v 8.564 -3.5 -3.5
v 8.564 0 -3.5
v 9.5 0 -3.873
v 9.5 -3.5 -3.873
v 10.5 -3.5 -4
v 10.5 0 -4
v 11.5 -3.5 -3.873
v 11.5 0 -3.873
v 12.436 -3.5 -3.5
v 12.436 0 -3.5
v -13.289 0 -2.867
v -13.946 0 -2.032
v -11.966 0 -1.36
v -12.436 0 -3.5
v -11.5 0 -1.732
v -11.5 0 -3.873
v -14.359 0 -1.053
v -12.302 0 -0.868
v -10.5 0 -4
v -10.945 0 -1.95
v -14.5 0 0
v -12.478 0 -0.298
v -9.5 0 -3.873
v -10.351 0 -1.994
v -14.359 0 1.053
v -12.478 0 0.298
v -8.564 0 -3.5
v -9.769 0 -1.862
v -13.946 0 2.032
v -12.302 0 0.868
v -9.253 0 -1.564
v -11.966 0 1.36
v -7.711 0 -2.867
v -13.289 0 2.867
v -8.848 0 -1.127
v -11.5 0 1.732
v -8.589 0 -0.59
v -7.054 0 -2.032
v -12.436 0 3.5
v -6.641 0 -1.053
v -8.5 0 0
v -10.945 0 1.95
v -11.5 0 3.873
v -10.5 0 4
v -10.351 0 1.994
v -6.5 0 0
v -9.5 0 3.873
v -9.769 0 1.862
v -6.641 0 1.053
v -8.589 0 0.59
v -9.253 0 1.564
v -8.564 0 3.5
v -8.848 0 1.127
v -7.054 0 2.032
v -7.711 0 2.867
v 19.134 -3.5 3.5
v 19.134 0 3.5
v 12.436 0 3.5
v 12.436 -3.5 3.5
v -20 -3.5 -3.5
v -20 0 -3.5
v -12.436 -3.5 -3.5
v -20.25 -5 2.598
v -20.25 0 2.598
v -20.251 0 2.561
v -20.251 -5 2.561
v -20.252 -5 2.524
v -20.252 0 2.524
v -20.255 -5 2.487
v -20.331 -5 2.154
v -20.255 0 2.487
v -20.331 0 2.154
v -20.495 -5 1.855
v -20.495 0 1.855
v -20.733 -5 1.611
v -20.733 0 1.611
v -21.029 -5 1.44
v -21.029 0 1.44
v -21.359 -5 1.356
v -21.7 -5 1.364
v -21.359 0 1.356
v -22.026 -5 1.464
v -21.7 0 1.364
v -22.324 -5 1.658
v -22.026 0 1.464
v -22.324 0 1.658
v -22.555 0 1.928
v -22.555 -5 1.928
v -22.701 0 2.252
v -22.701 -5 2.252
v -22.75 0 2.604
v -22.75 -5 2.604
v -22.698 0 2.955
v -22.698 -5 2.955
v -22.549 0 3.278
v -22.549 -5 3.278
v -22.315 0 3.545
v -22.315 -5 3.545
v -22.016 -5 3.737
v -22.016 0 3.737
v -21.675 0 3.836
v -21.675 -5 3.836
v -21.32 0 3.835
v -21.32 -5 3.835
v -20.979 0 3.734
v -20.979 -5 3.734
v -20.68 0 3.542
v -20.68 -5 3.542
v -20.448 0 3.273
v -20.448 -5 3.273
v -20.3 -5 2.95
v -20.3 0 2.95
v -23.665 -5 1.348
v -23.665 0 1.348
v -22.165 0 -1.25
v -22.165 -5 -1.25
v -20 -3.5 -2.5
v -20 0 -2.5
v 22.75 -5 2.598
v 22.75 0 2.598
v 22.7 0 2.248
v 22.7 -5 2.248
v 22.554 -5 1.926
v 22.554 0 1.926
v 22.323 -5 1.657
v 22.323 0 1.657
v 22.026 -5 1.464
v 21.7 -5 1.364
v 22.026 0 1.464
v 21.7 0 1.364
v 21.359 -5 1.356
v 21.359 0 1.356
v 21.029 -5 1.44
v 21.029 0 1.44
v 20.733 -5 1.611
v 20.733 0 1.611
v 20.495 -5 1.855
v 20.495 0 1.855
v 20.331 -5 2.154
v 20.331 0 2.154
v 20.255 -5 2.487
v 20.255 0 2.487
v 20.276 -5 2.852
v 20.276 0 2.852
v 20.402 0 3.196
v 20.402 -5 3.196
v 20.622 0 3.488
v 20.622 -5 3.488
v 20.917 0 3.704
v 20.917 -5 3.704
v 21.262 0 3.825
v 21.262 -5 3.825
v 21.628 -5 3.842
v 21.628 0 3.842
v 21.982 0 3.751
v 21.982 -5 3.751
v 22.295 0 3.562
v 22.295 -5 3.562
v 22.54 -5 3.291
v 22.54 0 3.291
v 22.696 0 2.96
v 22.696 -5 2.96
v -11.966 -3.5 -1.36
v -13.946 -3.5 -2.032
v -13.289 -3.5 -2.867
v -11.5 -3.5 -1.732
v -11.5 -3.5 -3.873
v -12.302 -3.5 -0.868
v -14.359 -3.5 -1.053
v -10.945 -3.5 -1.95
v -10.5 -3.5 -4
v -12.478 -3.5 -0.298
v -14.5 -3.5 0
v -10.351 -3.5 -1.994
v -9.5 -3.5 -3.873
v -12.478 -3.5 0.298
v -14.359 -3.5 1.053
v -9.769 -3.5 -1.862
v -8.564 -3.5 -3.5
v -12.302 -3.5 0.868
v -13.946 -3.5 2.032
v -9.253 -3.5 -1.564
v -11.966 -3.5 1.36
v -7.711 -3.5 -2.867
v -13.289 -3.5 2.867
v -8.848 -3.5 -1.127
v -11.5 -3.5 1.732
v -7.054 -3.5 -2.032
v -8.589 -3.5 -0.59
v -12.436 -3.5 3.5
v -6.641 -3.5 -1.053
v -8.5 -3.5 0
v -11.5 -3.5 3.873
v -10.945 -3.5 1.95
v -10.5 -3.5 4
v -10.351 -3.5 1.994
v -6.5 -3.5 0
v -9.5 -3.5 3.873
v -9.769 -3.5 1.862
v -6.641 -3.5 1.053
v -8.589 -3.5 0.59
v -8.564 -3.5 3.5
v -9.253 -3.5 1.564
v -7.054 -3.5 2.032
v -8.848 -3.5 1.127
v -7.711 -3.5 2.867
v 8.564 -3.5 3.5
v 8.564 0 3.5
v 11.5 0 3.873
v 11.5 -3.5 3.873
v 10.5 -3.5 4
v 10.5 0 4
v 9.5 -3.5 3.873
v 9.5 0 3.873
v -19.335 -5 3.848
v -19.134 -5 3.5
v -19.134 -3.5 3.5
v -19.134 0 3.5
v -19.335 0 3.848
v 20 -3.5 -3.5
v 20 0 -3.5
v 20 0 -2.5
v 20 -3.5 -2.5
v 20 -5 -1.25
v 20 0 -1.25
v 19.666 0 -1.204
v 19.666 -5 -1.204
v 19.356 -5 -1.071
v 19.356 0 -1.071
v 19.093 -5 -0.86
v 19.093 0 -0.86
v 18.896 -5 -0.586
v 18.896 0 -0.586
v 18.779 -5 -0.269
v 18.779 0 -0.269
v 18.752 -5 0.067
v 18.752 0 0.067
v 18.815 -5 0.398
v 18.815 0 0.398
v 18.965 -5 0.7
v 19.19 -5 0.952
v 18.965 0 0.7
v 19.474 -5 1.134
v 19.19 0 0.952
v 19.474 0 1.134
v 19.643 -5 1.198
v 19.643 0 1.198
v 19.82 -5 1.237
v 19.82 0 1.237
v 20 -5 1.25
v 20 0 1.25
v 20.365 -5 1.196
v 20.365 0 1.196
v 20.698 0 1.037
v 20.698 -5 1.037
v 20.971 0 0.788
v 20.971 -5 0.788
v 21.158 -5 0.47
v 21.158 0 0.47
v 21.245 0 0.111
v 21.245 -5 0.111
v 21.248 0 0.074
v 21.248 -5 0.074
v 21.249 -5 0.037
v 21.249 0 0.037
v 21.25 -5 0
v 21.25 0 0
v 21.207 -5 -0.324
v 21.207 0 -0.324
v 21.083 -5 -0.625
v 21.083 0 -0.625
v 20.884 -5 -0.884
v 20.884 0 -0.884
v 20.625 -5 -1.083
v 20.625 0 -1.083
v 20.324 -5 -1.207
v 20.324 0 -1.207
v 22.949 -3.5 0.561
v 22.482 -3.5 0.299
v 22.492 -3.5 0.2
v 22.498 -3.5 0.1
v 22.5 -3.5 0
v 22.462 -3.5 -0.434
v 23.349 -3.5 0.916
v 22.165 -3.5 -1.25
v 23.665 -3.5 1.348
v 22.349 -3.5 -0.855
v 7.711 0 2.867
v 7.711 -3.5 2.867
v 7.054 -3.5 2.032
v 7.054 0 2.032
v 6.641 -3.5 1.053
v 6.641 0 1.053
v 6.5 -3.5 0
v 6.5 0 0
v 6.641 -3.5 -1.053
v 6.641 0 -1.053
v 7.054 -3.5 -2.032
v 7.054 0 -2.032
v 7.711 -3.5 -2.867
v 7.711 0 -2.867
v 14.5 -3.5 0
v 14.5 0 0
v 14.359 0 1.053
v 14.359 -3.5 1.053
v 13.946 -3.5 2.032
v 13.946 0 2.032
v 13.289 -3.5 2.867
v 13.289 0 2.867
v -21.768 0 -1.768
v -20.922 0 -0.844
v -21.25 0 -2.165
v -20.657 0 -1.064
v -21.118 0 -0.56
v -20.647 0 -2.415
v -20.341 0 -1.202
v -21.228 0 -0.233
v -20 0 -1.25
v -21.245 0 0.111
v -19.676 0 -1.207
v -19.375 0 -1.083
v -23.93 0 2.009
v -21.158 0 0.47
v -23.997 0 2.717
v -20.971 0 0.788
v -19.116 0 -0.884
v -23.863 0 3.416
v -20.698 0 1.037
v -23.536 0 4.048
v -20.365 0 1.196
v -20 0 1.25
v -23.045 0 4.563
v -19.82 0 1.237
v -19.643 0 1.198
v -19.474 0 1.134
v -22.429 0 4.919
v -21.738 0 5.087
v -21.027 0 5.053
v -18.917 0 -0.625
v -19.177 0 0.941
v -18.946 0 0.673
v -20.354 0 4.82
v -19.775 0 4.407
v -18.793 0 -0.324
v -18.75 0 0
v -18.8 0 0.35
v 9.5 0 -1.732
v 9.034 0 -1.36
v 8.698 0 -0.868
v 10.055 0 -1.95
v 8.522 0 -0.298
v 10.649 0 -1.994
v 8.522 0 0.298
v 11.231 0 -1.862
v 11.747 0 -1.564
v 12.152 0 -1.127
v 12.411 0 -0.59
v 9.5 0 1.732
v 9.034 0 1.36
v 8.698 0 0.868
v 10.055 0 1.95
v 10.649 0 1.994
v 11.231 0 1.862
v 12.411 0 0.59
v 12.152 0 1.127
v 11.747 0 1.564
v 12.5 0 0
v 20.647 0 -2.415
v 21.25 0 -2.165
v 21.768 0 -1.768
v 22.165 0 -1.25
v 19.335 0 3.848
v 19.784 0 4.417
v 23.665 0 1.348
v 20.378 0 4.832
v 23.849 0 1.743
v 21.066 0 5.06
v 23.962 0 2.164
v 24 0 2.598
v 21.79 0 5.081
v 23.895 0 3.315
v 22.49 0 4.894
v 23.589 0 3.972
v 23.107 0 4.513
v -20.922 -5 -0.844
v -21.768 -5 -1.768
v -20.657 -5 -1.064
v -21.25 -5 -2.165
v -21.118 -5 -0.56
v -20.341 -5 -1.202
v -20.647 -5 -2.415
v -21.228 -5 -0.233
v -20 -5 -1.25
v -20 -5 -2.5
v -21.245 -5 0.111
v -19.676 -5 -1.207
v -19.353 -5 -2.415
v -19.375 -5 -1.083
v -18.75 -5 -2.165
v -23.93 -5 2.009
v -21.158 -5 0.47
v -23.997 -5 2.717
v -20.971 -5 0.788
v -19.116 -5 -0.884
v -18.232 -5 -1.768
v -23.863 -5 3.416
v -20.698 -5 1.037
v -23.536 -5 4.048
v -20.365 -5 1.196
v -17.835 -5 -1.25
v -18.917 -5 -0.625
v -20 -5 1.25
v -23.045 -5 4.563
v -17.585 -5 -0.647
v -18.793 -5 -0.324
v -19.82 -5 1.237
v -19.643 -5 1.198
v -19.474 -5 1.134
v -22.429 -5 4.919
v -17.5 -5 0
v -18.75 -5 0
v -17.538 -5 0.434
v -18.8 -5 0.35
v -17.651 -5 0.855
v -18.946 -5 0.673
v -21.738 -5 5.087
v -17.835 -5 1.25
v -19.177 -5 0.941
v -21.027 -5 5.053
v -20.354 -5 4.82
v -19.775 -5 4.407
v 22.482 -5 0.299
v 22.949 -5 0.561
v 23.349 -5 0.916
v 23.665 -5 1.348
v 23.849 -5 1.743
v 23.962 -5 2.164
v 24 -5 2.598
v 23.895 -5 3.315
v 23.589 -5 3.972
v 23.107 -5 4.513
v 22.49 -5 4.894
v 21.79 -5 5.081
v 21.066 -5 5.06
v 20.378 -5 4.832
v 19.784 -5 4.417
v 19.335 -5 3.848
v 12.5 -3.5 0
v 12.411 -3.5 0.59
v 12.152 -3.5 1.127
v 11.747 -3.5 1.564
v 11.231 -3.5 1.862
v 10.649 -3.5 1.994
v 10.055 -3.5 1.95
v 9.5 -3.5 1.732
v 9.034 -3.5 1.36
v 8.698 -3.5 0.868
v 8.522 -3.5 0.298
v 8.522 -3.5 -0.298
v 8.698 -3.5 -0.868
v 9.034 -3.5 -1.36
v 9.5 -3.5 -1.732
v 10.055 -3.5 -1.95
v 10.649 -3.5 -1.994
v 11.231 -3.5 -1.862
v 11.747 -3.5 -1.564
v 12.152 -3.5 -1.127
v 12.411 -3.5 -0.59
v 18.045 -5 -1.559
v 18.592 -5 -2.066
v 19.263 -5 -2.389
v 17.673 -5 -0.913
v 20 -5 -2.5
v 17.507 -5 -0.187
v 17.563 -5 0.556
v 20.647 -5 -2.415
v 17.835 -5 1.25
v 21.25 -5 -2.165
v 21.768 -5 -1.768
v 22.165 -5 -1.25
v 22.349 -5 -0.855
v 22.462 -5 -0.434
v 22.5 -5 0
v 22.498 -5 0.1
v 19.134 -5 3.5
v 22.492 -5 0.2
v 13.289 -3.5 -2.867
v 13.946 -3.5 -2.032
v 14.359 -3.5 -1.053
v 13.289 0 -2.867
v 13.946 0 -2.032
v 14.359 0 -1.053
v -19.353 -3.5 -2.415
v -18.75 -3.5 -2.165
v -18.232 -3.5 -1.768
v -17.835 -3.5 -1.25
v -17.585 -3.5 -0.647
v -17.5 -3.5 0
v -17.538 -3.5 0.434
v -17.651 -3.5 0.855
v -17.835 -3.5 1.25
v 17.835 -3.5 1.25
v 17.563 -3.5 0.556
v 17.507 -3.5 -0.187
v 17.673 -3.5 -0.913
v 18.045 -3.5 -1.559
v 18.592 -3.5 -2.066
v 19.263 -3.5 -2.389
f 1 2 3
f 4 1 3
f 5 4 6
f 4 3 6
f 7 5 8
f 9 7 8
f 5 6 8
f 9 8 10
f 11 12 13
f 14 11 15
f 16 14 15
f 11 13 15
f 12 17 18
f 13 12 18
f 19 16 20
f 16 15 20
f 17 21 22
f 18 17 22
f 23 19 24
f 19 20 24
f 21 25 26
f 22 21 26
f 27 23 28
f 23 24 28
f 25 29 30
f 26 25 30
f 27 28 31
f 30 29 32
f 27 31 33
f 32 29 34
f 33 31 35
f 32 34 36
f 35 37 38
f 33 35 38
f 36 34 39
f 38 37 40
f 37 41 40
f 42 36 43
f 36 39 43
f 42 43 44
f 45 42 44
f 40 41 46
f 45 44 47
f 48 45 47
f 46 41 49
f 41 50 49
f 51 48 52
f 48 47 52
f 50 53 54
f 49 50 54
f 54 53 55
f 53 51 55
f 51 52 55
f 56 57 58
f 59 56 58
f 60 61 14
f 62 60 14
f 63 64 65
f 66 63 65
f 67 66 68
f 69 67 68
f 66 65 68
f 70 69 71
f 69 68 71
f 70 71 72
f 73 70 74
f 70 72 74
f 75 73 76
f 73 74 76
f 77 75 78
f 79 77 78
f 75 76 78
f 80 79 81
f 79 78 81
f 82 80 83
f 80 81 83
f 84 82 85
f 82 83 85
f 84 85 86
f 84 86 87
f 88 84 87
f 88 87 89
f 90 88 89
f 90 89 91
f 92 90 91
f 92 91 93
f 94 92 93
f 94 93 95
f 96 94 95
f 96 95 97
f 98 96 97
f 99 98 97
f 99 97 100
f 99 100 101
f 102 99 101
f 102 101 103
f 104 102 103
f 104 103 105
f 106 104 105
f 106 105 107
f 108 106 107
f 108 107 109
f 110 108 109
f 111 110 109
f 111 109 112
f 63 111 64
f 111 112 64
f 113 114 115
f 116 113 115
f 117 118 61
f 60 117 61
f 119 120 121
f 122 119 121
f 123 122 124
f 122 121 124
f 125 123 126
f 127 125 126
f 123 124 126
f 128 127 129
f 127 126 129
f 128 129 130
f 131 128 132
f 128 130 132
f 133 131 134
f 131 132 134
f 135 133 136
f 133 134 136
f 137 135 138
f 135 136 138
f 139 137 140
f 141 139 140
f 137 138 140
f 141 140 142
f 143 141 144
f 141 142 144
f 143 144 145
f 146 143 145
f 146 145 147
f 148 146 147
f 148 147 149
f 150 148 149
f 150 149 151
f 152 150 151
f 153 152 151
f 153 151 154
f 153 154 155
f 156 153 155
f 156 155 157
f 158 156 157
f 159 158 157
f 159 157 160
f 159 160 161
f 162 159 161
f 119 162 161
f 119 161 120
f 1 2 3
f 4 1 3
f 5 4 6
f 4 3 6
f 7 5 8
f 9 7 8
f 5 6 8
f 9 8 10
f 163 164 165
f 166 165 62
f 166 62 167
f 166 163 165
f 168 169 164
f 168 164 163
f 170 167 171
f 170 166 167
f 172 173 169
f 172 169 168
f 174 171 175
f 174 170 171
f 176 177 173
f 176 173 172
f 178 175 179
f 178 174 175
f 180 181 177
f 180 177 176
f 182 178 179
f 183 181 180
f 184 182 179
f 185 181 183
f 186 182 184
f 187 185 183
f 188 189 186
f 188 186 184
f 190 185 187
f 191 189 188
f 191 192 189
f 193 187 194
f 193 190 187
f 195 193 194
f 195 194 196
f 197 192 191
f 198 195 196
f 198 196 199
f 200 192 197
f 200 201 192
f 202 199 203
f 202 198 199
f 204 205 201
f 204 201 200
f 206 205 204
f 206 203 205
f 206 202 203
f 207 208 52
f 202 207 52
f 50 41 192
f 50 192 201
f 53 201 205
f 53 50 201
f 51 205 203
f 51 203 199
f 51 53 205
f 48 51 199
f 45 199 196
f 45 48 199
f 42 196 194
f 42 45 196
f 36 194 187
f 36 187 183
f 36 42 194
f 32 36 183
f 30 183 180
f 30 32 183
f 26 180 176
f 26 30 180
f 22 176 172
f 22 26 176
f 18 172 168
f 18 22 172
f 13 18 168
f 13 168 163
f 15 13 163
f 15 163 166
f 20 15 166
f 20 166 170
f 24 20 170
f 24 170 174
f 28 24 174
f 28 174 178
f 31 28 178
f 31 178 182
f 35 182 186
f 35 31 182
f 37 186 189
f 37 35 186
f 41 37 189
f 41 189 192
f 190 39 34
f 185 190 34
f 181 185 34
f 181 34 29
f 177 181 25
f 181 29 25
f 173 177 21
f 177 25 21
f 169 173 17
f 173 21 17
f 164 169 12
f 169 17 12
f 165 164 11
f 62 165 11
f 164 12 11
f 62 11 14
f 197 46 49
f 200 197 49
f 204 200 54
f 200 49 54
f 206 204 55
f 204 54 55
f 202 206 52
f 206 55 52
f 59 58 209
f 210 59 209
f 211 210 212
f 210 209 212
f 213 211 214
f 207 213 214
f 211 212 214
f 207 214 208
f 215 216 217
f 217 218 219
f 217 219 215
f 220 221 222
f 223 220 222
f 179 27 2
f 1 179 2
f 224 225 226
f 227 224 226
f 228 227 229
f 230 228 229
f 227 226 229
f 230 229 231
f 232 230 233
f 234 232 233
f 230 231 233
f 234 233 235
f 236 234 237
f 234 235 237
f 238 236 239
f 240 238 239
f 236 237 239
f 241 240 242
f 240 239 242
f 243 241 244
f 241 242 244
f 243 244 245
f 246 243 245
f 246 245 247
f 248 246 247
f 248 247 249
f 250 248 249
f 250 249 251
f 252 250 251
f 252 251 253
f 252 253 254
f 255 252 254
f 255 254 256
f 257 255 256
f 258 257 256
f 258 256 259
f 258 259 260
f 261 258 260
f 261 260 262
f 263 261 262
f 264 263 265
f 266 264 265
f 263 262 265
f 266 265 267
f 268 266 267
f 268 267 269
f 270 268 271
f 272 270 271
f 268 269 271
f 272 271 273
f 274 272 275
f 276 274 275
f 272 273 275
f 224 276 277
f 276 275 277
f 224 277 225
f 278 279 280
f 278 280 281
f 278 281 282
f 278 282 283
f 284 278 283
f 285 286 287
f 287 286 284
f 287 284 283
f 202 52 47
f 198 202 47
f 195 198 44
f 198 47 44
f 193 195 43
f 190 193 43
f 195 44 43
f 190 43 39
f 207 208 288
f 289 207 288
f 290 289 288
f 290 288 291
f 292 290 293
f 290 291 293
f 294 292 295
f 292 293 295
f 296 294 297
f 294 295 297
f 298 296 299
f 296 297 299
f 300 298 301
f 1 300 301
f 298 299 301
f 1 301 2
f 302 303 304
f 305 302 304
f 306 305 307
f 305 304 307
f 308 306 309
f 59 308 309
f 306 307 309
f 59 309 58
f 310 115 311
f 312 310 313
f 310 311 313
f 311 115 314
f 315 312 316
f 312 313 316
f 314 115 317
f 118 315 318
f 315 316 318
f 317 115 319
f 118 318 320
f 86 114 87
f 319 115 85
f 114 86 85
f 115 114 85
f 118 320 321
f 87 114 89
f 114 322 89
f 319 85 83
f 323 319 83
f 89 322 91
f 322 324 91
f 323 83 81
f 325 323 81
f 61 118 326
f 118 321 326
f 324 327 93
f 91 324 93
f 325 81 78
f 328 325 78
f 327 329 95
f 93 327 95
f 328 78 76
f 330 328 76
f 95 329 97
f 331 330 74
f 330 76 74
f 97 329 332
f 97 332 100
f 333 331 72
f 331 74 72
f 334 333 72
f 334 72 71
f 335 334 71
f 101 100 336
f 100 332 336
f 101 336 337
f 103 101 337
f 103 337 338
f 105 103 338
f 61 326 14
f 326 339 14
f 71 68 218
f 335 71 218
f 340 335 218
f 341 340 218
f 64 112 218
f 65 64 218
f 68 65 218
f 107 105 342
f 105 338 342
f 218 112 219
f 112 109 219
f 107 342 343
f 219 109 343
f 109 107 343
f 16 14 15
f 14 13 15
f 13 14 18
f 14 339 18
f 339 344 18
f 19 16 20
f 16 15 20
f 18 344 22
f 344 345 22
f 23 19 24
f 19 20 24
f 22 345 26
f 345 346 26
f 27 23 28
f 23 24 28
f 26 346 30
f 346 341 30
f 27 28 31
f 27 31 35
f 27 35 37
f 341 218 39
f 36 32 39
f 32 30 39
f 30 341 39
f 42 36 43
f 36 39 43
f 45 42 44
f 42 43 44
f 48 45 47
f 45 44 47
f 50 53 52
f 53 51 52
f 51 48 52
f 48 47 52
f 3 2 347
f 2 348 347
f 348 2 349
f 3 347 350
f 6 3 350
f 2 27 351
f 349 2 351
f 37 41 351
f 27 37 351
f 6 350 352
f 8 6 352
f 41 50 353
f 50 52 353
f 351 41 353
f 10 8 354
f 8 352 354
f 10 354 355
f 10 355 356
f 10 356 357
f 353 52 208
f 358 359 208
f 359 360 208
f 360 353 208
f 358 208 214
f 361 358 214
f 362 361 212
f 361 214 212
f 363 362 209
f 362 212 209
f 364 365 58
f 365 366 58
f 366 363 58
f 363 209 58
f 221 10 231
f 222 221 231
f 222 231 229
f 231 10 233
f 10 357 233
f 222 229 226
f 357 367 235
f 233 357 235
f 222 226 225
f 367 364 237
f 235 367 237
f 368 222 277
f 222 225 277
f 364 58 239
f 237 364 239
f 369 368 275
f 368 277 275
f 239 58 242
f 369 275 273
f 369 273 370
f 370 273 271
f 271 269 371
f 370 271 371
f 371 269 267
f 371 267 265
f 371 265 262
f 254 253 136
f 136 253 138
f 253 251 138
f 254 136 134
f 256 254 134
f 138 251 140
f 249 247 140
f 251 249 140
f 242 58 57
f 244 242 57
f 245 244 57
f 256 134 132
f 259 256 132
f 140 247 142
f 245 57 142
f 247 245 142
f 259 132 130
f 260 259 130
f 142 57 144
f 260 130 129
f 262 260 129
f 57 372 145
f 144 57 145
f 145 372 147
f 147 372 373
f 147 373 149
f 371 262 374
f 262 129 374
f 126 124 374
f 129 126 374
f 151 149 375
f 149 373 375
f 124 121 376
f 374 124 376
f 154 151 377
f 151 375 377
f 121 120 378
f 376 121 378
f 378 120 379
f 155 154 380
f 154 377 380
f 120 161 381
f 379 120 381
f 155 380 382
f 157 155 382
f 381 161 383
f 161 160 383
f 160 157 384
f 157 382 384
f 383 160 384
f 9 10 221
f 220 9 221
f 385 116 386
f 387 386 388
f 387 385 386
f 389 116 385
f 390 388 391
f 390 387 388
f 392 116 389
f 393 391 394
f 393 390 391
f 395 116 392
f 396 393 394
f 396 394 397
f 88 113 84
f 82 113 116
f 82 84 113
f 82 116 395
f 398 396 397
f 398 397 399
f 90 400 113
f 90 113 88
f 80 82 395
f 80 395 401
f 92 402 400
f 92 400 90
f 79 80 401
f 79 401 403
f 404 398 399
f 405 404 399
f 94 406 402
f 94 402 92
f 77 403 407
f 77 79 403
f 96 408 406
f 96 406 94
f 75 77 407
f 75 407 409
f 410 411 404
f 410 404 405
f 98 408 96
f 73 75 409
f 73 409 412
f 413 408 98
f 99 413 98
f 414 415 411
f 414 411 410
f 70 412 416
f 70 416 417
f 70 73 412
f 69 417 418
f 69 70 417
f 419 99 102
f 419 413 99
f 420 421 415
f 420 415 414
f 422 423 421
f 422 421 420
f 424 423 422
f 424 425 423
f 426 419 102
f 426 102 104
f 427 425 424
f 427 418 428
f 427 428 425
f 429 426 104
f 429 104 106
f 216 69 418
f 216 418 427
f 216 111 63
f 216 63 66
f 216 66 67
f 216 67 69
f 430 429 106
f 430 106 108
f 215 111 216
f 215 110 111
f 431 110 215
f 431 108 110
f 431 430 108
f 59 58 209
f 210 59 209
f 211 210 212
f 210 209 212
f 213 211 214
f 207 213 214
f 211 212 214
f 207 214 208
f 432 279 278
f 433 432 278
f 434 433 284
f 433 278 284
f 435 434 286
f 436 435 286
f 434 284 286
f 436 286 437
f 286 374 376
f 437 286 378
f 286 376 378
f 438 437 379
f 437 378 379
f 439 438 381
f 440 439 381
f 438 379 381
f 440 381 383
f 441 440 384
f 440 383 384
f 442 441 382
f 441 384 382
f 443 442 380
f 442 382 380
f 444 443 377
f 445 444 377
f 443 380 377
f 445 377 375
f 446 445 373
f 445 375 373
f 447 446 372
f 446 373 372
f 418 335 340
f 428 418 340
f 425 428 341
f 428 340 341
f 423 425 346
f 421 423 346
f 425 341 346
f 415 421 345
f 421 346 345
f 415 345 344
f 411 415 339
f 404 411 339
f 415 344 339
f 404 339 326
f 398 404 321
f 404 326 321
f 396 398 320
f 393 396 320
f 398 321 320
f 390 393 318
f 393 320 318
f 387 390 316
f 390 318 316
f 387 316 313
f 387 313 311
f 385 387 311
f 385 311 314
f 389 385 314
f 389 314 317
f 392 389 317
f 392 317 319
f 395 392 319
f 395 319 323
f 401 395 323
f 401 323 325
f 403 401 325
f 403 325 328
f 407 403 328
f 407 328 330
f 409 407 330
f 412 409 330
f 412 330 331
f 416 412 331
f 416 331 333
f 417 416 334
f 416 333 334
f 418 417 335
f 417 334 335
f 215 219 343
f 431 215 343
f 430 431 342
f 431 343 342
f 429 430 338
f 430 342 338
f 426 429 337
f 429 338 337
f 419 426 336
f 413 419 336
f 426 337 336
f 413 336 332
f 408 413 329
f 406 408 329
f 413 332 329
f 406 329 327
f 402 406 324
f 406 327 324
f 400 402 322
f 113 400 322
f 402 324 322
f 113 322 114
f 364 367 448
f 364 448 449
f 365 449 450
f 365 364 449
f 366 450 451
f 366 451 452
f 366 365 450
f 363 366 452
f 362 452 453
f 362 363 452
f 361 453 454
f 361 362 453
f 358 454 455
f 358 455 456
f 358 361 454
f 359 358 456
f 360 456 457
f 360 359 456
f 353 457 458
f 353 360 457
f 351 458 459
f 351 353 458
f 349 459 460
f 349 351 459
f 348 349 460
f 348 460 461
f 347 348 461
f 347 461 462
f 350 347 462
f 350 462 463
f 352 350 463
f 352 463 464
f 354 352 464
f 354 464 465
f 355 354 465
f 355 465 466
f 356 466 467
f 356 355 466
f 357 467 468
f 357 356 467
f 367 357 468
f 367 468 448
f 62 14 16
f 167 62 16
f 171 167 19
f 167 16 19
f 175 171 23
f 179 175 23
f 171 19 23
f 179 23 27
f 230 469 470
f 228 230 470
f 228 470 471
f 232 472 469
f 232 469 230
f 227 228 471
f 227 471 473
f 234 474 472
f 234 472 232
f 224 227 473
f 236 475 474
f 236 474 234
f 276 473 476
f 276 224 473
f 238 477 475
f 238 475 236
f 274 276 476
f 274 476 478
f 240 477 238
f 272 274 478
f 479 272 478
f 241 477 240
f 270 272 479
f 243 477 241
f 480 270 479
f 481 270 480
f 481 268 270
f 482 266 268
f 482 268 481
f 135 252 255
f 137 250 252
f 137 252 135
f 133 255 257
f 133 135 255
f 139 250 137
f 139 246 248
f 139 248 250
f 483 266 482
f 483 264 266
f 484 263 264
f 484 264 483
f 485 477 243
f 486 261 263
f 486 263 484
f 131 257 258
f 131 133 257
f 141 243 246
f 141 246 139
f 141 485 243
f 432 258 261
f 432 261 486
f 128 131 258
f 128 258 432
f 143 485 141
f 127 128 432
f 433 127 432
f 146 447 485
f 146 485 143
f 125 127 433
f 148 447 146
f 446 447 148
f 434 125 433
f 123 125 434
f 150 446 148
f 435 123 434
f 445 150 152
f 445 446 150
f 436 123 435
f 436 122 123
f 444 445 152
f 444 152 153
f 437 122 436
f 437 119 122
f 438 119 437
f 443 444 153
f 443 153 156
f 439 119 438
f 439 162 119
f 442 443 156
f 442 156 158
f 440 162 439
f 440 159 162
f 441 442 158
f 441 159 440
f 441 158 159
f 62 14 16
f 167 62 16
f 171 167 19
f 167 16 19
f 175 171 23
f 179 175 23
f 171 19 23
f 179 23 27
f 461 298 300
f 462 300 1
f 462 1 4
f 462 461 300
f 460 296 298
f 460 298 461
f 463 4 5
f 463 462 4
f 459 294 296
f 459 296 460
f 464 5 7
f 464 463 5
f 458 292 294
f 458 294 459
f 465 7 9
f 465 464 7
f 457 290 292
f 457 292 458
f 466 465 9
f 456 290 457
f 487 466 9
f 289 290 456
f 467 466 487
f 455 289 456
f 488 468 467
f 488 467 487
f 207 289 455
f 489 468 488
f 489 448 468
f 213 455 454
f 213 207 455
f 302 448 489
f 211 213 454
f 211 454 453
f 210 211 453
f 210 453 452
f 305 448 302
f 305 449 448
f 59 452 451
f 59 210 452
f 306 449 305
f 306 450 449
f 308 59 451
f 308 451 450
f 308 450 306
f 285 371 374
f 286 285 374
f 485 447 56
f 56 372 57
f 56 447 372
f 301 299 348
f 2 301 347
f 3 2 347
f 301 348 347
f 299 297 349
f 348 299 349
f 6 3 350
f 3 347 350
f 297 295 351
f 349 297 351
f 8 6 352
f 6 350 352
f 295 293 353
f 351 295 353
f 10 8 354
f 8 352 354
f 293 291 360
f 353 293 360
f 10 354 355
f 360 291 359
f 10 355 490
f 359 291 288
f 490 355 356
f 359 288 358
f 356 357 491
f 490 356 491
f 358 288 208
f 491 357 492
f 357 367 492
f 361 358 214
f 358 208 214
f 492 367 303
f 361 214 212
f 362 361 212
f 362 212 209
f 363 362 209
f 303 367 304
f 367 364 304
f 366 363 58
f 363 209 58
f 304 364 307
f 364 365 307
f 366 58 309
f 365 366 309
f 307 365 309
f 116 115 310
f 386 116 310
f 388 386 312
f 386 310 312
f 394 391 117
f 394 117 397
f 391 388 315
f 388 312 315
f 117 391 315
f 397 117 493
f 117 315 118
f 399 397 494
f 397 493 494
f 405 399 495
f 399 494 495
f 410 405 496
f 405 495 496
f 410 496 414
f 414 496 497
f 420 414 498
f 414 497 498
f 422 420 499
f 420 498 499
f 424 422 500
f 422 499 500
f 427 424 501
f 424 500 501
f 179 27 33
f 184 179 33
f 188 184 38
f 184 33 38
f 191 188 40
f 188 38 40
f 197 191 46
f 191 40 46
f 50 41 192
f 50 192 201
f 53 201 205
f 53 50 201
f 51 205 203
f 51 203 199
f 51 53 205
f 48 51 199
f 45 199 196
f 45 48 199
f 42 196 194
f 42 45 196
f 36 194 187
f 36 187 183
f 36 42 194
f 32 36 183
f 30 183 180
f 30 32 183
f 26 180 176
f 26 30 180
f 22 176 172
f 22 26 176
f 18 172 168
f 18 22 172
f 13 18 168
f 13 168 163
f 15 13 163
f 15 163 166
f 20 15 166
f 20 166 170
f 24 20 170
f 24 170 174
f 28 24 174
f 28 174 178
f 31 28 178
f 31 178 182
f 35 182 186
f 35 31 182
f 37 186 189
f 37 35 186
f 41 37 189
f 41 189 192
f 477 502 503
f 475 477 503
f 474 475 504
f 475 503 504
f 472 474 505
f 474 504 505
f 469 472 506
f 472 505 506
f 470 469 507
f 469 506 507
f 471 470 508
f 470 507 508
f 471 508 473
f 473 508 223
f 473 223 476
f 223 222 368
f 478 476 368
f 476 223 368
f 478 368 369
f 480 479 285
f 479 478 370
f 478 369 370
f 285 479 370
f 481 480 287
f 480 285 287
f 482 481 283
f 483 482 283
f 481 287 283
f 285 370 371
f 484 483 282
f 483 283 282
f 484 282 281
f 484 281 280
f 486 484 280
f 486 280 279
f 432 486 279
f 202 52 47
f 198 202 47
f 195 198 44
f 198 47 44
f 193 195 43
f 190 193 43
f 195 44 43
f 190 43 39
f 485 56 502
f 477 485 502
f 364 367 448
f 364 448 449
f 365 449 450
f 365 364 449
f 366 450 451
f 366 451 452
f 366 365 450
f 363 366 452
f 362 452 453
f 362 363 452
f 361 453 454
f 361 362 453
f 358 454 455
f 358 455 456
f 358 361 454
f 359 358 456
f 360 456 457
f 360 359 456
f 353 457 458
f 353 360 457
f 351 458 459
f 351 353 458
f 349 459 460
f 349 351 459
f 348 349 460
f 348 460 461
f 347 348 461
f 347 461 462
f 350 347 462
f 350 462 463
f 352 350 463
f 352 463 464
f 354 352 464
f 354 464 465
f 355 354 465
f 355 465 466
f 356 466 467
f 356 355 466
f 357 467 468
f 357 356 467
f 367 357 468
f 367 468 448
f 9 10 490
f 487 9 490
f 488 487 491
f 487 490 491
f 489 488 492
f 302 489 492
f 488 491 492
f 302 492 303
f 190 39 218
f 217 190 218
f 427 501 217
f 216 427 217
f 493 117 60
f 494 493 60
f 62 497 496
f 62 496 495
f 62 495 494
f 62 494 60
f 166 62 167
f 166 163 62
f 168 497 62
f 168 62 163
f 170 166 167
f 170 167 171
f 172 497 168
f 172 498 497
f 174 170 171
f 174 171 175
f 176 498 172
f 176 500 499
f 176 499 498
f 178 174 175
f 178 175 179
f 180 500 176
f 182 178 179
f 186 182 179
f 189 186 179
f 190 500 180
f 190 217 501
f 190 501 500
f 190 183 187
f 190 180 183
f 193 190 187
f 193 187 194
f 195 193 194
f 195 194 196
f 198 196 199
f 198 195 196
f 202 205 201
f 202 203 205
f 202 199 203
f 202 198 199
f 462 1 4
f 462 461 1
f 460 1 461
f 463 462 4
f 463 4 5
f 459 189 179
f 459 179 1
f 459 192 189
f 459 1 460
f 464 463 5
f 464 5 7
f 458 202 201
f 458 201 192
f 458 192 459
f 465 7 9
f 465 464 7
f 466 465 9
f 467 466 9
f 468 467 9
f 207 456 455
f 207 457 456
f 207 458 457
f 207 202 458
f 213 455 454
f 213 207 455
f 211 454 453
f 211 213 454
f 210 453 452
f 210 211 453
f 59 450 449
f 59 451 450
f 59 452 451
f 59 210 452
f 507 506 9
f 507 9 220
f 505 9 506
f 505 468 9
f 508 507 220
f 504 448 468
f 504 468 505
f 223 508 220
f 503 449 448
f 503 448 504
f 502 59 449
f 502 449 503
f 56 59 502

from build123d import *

# Parameters (mm, degrees)
F0_R     = 2
F1_DEPTH = 3.5
F2_DEPTH = 3.5
F3_DEPTH = 5


with BuildPart() as f1:
    # F0 (on Front) → F1 (new body)
    with BuildSketch(Plane.XZ):
        with BuildLine():
            Line((-20, 2.5), (-20, 3.5))
            Line((-20, 3.5), (-19.1683624897, 3.5))
            ThreePointArc((-19.1683624897, 3.5), (-19.2449236648, 3.6772567905), (-19.3349364905, 3.8480762114))
            ThreePointArc((-19.3349364905, 3.8480762114), (-22.75, 4.7631397208), (-23.6650635095, 1.3480762114))
            ThreePointArc((-23.6650635095, 1.3480762114), (-23.1586748831, 0.7275688919), (-22.4820508076, 0.2990381057))
            ThreePointArc((-22.4820508076, 0.2990381057), (-22.3282515686, 0.9106287023), (-22.026302045, 1.464274572))
            ThreePointArc((-22.026302045, 1.464274572), (-22.17254087, 3.651731173), (-20.25, 2.5980762114))
            ThreePointArc((-20.25, 2.5980762114), (-20.2512376014, 2.5424662136), (-20.254947955, 2.4869663328))
            ThreePointArc((-20.254947955, 2.4869663328), (-20.1276404483, 2.496739457), (-20, 2.5))
        make_face()
        with BuildLine():
            ThreePointArc((-22.4820508076, 0.2990381057), (-23.1586748831, 0.7275688919), (-23.6650635095, 1.3480762114))
            Line((-23.6650635095, 1.3480762114), (-22.1650635095, -1.25))
            ThreePointArc((-22.1650635095, -1.25), (-22.4492442982, -0.5012009257), (-22.4820508076, 0.2990381057))
        make_face()
        with BuildLine():
            ThreePointArc((-20, -1.25), (-20.9223305666, -0.8436861537), (-21.245052045, 0.1111098786))
            ThreePointArc((-21.245052045, 0.1111098786), (-21.8754981947, 0.1264368554), (-22.4820508076, 0.2990381057))
            ThreePointArc((-22.4820508076, 0.2990381057), (-22.4492442982, -0.5012009257), (-22.1650635095, -1.25))
            ThreePointArc((-22.1650635095, -1.25), (-21.25, -2.1650635095), (-20, -2.5))
            Line((-20, -2.5), (-20, -1.25))
        make_face()
        with BuildLine():
            Line((-20, 1.25), (-20, 2.5))
            ThreePointArc((-20, 2.5), (-20.1276404483, 2.496739457), (-20.254947955, 2.4869663328))
            ThreePointArc((-20.254947955, 2.4869663328), (-20.875, 1.5155444566), (-22.026302045, 1.464274572))
            ThreePointArc((-22.026302045, 1.464274572), (-22.3282515686, 0.9106287023), (-22.4820508076, 0.2990381057))
            ThreePointArc((-22.4820508076, 0.2990381057), (-21.8754981947, 0.1264368554), (-21.245052045, 0.1111098786))
            ThreePointArc((-21.245052045, 0.1111098786), (-20.8436861537, 0.9223305666), (-20, 1.25))
        make_face()
        with BuildLine():
            ThreePointArc((-19.0179491924, 2.2990381057), (-19.4987990743, 2.4492442982), (-20, 2.5))
            Line((-20, 2.5), (-20, 1.25))
            ThreePointArc((-20, 1.25), (-19.7305116414, 1.2206047782), (-19.473697955, 1.1338016393))
            ThreePointArc((-19.473697955, 1.1338016393), (-19.1717484314, 1.6874475091), (-19.0179491924, 2.2990381057))
        make_face()
        with BuildLine():
            Line((-19.1683624897, 3.5), (-20, 3.5))
            Line((-20, 3.5), (-20, 2.5))
            ThreePointArc((-20, 2.5), (-19.4987990743, 2.4492442982), (-19.0179491924, 2.2990381057))
            ThreePointArc((-19.0179491924, 2.2990381057), (-19.0044913325, 2.4482880592), (-19, 2.5980762114))
            ThreePointArc((-19, 2.5980762114), (-19.0424510406, 3.0568279003), (-19.1683624897, 3.5))
        make_face()
        with BuildLine():
            ThreePointArc((-17.8349364905, 1.25), (-18.3413251169, 1.8705073194), (-19.0179491924, 2.2990381057))
            ThreePointArc((-19.0179491924, 2.2990381057), (-19.1717484314, 1.6874475091), (-19.473697955, 1.1338016393))
            ThreePointArc((-19.473697955, 1.1338016393), (-18.9463450384, 0.67254087), (-18.75, 0))
            ThreePointArc((-18.75, 0), (-19.1161165235, -0.8838834765), (-20, -1.25))
            Line((-20, -1.25), (-20, -2.5))
            ThreePointArc((-20, -2.5), (-18.232233047, -1.767766953), (-17.5, 0))
            ThreePointArc((-17.5, 0), (-17.5851854343, 0.6470476128), (-17.8349364905, 1.25))
        make_face()
        with BuildLine():
            Line((-19.1339745962, 3.5), (-19.1683624897, 3.5))
            ThreePointArc((-19.1683624897, 3.5), (-19.0424510406, 3.0568279003), (-19, 2.5980762114))
            ThreePointArc((-19, 2.5980762114), (-19.0044913325, 2.4482880592), (-19.0179491924, 2.2990381057))
            ThreePointArc((-19.0179491924, 2.2990381057), (-18.3413251169, 1.8705073194), (-17.8349364905, 1.25))
            Line((-17.8349364905, 1.25), (-19.1339745962, 3.5))
        make_face()
        with BuildLine():
            ThreePointArc((-19.3349364905, 3.8480762114), (-19.2449236648, 3.6772567905), (-19.1683624897, 3.5))
            Line((-19.1683624897, 3.5), (-19.1339745962, 3.5))
            Line((-19.1339745962, 3.5), (-19.3349364905, 3.8480762114))
        make_face()
        with BuildLine():
            Line((-12.4364916731, 3.5), (-19.1339745962, 3.5))
            Line((-19.1339745962, 3.5), (-17.8349364905, 1.25))
            ThreePointArc((-17.8349364905, 1.25), (-17.5851854343, 0.6470476128), (-17.5, 0))
            ThreePointArc((-17.5, 0), (-18.232233047, -1.767766953), (-20, -2.5))
            Line((-20, -2.5), (-20, -3.5))
            Line((-20, -3.5), (-12.4364916731, -3.5))
            ThreePointArc((-12.4364916731, -3.5), (-14.5, 0), (-12.4364916731, 3.5))
        make_face()
        with BuildLine():
            Line((-8.5635083269, 3.5), (-12.4364916731, 3.5))
            ThreePointArc((-12.4364916731, 3.5), (-14.5, 0), (-12.4364916731, -3.5))
            Line((-12.4364916731, -3.5), (-8.5635083269, -3.5))
            ThreePointArc((-8.5635083269, -3.5), (-7.0542804313, -2.0315060063), (-6.5, 0))
            ThreePointArc((-6.5, 0), (-7.0542804313, 2.0315060063), (-8.5635083269, 3.5))
        make_face()
        with Locations((-10.5, 0)):
            Circle(F0_R, mode=Mode.SUBTRACT)
        with BuildLine():
            ThreePointArc((-8.5635083269, 3.5), (-10.5, 4), (-12.4364916731, 3.5))
            Line((-12.4364916731, 3.5), (-8.5635083269, 3.5))
        make_face()
        with BuildLine():
            Line((-8.5635083269, -3.5), (-12.4364916731, -3.5))
            ThreePointArc((-12.4364916731, -3.5), (-10.5, -4), (-8.5635083269, -3.5))
        make_face()
        with BuildLine():
            Line((8.5635083269, 3.5), (-8.5635083269, 3.5))
            ThreePointArc((-8.5635083269, 3.5), (-7.0542804313, 2.0315060063), (-6.5, 0))
            ThreePointArc((-6.5, 0), (-7.0542804313, -2.0315060063), (-8.5635083269, -3.5))
            Line((-8.5635083269, -3.5), (8.5635083269, -3.5))
            ThreePointArc((8.5635083269, -3.5), (6.5, 0), (8.5635083269, 3.5))
        make_face()
        with BuildLine():
            Line((19.1339745962, 3.5), (12.4364916731, 3.5))
            ThreePointArc((12.4364916731, 3.5), (13.9457195687, 2.0315060063), (14.5, 0))
            ThreePointArc((14.5, 0), (13.9457195687, -2.0315060063), (12.4364916731, -3.5))
            Line((12.4364916731, -3.5), (20, -3.5))
            Line((20, -3.5), (20, -2.5))
            ThreePointArc((20, -2.5), (17.8349364905, -1.25), (17.8349364905, 1.25))
            Line((17.8349364905, 1.25), (19.1339745962, 3.5))
        make_face()
        with BuildLine():
            Line((12.4364916731, 3.5), (8.5635083269, 3.5))
            ThreePointArc((8.5635083269, 3.5), (6.5, 0), (8.5635083269, -3.5))
            Line((8.5635083269, -3.5), (12.4364916731, -3.5))
            ThreePointArc((12.4364916731, -3.5), (13.9457195687, -2.0315060063), (14.5, 0))
            ThreePointArc((14.5, 0), (13.9457195687, 2.0315060063), (12.4364916731, 3.5))
        make_face()
        with Locations((10.5, 0)):
            Circle(F0_R, mode=Mode.SUBTRACT)
        with BuildLine():
            ThreePointArc((12.4364916731, 3.5), (10.5, 4), (8.5635083269, 3.5))
            Line((8.5635083269, 3.5), (12.4364916731, 3.5))
        make_face()
        with BuildLine():
            Line((12.4364916731, -3.5), (8.5635083269, -3.5))
            ThreePointArc((8.5635083269, -3.5), (10.5, -4), (12.4364916731, -3.5))
        make_face()
        with BuildLine():
            ThreePointArc((19.0179491924, 2.2990381057), (18.3413251169, 1.8705073194), (17.8349364905, 1.25))
            ThreePointArc((17.8349364905, 1.25), (17.8349364905, -1.25), (20, -2.5))
            Line((20, -2.5), (20, -1.25))
            ThreePointArc((20, -1.25), (18.7793952218, -0.2694883586), (19.473697955, 1.1338016393))
            ThreePointArc((19.473697955, 1.1338016393), (19.1717484314, 1.6874475091), (19.0179491924, 2.2990381057))
        make_face()
        with BuildLine():
            ThreePointArc((20.254947955, 2.4869663328), (20.1276404483, 2.496739457), (20, 2.5))
            Line((20, 2.5), (20, 1.25))
            ThreePointArc((20, 1.25), (20.8436861537, 0.9223305666), (21.245052045, 0.1111098786))
            ThreePointArc((21.245052045, 0.1111098786), (21.8754981947, 0.1264368554), (22.4820508076, 0.2990381057))
            ThreePointArc((22.4820508076, 0.2990381057), (22.3282515686, 0.9106287023), (22.026302045, 1.464274572))
            ThreePointArc((22.026302045, 1.464274572), (20.875, 1.5155444566), (20.254947955, 2.4869663328))
        make_face()
        with BuildLine():
            Line((20, -1.25), (20, -2.5))
            ThreePointArc((20, -2.5), (21.25, -2.1650635095), (22.1650635095, -1.25))
            ThreePointArc((22.1650635095, -1.25), (22.4148145657, -0.6470476128), (22.5, 0))
            ThreePointArc((22.5, 0), (22.4955086675, 0.1497881522), (22.4820508076, 0.2990381057))
            ThreePointArc((22.4820508076, 0.2990381057), (21.8754981947, 0.1264368554), (21.245052045, 0.1111098786))
            ThreePointArc((21.245052045, 0.1111098786), (21.2487623986, 0.0556099977), (21.25, 0))
            ThreePointArc((21.25, 0), (20.8838834765, -0.8838834765), (20, -1.25))
        make_face()
        with BuildLine():
            ThreePointArc((20, 2.5), (19.4987990743, 2.4492442982), (19.0179491924, 2.2990381057))
            ThreePointArc((19.0179491924, 2.2990381057), (19.1717484314, 1.6874475091), (19.473697955, 1.1338016393))
            ThreePointArc((19.473697955, 1.1338016393), (19.7305116414, 1.2206047782), (20, 1.25))
            Line((20, 1.25), (20, 2.5))
        make_face()
        with BuildLine():
            ThreePointArc((19.3349364905, 3.8480762114), (19.2449236648, 3.6772567905), (19.1683624897, 3.5))
            Line((19.1683624897, 3.5), (20, 3.5))
            Line((20, 3.5), (20, 2.5))
            ThreePointArc((20, 2.5), (20.1276404483, 2.496739457), (20.254947955, 2.4869663328))
            ThreePointArc((20.254947955, 2.4869663328), (21.4443900023, 3.84683861), (22.75, 2.5980762114))
            ThreePointArc((22.75, 2.5980762114), (22.5536549616, 1.9255353413), (22.026302045, 1.464274572))
            ThreePointArc((22.026302045, 1.464274572), (22.3282515686, 0.9106287023), (22.4820508076, 0.2990381057))
            ThreePointArc((22.4820508076, 0.2990381057), (23.1586748831, 0.7275688919), (23.6650635095, 1.3480762114))
            ThreePointArc((23.6650635095, 1.3480762114), (23.9148145657, 1.9510285986), (24, 2.5980762114))
            ThreePointArc((24, 2.5980762114), (22.1470476128, 5.0128907771), (19.3349364905, 3.8480762114))
        make_face()
        with BuildLine():
            Line((19.1683624897, 3.5), (19.1339745962, 3.5))
            Line((19.1339745962, 3.5), (17.8349364905, 1.25))
            ThreePointArc((17.8349364905, 1.25), (18.3413251169, 1.8705073194), (19.0179491924, 2.2990381057))
            ThreePointArc((19.0179491924, 2.2990381057), (19.0193798813, 2.9087590507), (19.1683624897, 3.5))
        make_face()
        with BuildLine():
            Line((19.3349364905, 3.8480762114), (19.1339745962, 3.5))
            Line((19.1339745962, 3.5), (19.1683624897, 3.5))
            ThreePointArc((19.1683624897, 3.5), (19.2449236648, 3.6772567905), (19.3349364905, 3.8480762114))
        make_face()
        with BuildLine():
            Line((20, 3.5), (19.1683624897, 3.5))
            ThreePointArc((19.1683624897, 3.5), (19.0193798813, 2.9087590507), (19.0179491924, 2.2990381057))
            ThreePointArc((19.0179491924, 2.2990381057), (19.4987990743, 2.4492442982), (20, 2.5))
            Line((20, 2.5), (20, 3.5))
        make_face()
        with BuildLine():
            Line((22.1650635095, -1.25), (23.6650635095, 1.3480762114))
            ThreePointArc((23.6650635095, 1.3480762114), (23.1586748831, 0.7275688919), (22.4820508076, 0.2990381057))
            ThreePointArc((22.4820508076, 0.2990381057), (22.4955086675, 0.1497881522), (22.5, 0))
            ThreePointArc((22.5, 0), (22.4148145657, -0.6470476128), (22.1650635095, -1.25))
        make_face()
    extrude(amount=F1_DEPTH)

    # F0 (on Front) → F3 (join)
    with BuildSketch(Plane.XZ):
        with BuildLine():
            Line((-20, 2.5), (-20, 3.5))
            Line((-20, 3.5), (-19.1683624897, 3.5))
            ThreePointArc((-19.1683624897, 3.5), (-19.2449236648, 3.6772567905), (-19.3349364905, 3.8480762114))
            ThreePointArc((-19.3349364905, 3.8480762114), (-22.75, 4.7631397208), (-23.6650635095, 1.3480762114))
            ThreePointArc((-23.6650635095, 1.3480762114), (-23.1586748831, 0.7275688919), (-22.4820508076, 0.2990381057))
            ThreePointArc((-22.4820508076, 0.2990381057), (-22.3282515686, 0.9106287023), (-22.026302045, 1.464274572))
            ThreePointArc((-22.026302045, 1.464274572), (-22.17254087, 3.651731173), (-20.25, 2.5980762114))
            ThreePointArc((-20.25, 2.5980762114), (-20.2512376014, 2.5424662136), (-20.254947955, 2.4869663328))
            ThreePointArc((-20.254947955, 2.4869663328), (-20.1276404483, 2.496739457), (-20, 2.5))
        make_face()
        with BuildLine():
            Line((-20, 1.25), (-20, 2.5))
            ThreePointArc((-20, 2.5), (-20.1276404483, 2.496739457), (-20.254947955, 2.4869663328))
            ThreePointArc((-20.254947955, 2.4869663328), (-20.875, 1.5155444566), (-22.026302045, 1.464274572))
            ThreePointArc((-22.026302045, 1.464274572), (-22.3282515686, 0.9106287023), (-22.4820508076, 0.2990381057))
            ThreePointArc((-22.4820508076, 0.2990381057), (-21.8754981947, 0.1264368554), (-21.245052045, 0.1111098786))
            ThreePointArc((-21.245052045, 0.1111098786), (-20.8436861537, 0.9223305666), (-20, 1.25))
        make_face()
        with BuildLine():
            ThreePointArc((-20, -1.25), (-20.9223305666, -0.8436861537), (-21.245052045, 0.1111098786))
            ThreePointArc((-21.245052045, 0.1111098786), (-21.8754981947, 0.1264368554), (-22.4820508076, 0.2990381057))
            ThreePointArc((-22.4820508076, 0.2990381057), (-22.4492442982, -0.5012009257), (-22.1650635095, -1.25))
            ThreePointArc((-22.1650635095, -1.25), (-21.25, -2.1650635095), (-20, -2.5))
            Line((-20, -2.5), (-20, -1.25))
        make_face()
        with BuildLine():
            ThreePointArc((-17.8349364905, 1.25), (-18.3413251169, 1.8705073194), (-19.0179491924, 2.2990381057))
            ThreePointArc((-19.0179491924, 2.2990381057), (-19.1717484314, 1.6874475091), (-19.473697955, 1.1338016393))
            ThreePointArc((-19.473697955, 1.1338016393), (-18.9463450384, 0.67254087), (-18.75, 0))
            ThreePointArc((-18.75, 0), (-19.1161165235, -0.8838834765), (-20, -1.25))
            Line((-20, -1.25), (-20, -2.5))
            ThreePointArc((-20, -2.5), (-18.232233047, -1.767766953), (-17.5, 0))
            ThreePointArc((-17.5, 0), (-17.5851854343, 0.6470476128), (-17.8349364905, 1.25))
        make_face()
        with BuildLine():
            ThreePointArc((-19.0179491924, 2.2990381057), (-19.4987990743, 2.4492442982), (-20, 2.5))
            Line((-20, 2.5), (-20, 1.25))
            ThreePointArc((-20, 1.25), (-19.7305116414, 1.2206047782), (-19.473697955, 1.1338016393))
            ThreePointArc((-19.473697955, 1.1338016393), (-19.1717484314, 1.6874475091), (-19.0179491924, 2.2990381057))
        make_face()
        with BuildLine():
            Line((-19.1339745962, 3.5), (-19.1683624897, 3.5))
            ThreePointArc((-19.1683624897, 3.5), (-19.0424510406, 3.0568279003), (-19, 2.5980762114))
            ThreePointArc((-19, 2.5980762114), (-19.0044913325, 2.4482880592), (-19.0179491924, 2.2990381057))
            ThreePointArc((-19.0179491924, 2.2990381057), (-18.3413251169, 1.8705073194), (-17.8349364905, 1.25))
            Line((-17.8349364905, 1.25), (-19.1339745962, 3.5))
        make_face()
        with BuildLine():
            Line((-19.1683624897, 3.5), (-20, 3.5))
            Line((-20, 3.5), (-20, 2.5))
            ThreePointArc((-20, 2.5), (-19.4987990743, 2.4492442982), (-19.0179491924, 2.2990381057))
            ThreePointArc((-19.0179491924, 2.2990381057), (-19.0044913325, 2.4482880592), (-19, 2.5980762114))
            ThreePointArc((-19, 2.5980762114), (-19.0424510406, 3.0568279003), (-19.1683624897, 3.5))
        make_face()
        with BuildLine():
            ThreePointArc((-19.3349364905, 3.8480762114), (-19.2449236648, 3.6772567905), (-19.1683624897, 3.5))
            Line((-19.1683624897, 3.5), (-19.1339745962, 3.5))
            Line((-19.1339745962, 3.5), (-19.3349364905, 3.8480762114))
        make_face()
        with BuildLine():
            ThreePointArc((-22.4820508076, 0.2990381057), (-23.1586748831, 0.7275688919), (-23.6650635095, 1.3480762114))
            Line((-23.6650635095, 1.3480762114), (-22.1650635095, -1.25))
            ThreePointArc((-22.1650635095, -1.25), (-22.4492442982, -0.5012009257), (-22.4820508076, 0.2990381057))
        make_face()
        with BuildLine():
            ThreePointArc((19.0179491924, 2.2990381057), (18.3413251169, 1.8705073194), (17.8349364905, 1.25))
            ThreePointArc((17.8349364905, 1.25), (17.8349364905, -1.25), (20, -2.5))
            Line((20, -2.5), (20, -1.25))
            ThreePointArc((20, -1.25), (18.7793952218, -0.2694883586), (19.473697955, 1.1338016393))
            ThreePointArc((19.473697955, 1.1338016393), (19.1717484314, 1.6874475091), (19.0179491924, 2.2990381057))
        make_face()
        with BuildLine():
            Line((20, -1.25), (20, -2.5))
            ThreePointArc((20, -2.5), (21.25, -2.1650635095), (22.1650635095, -1.25))
            ThreePointArc((22.1650635095, -1.25), (22.4148145657, -0.6470476128), (22.5, 0))
            ThreePointArc((22.5, 0), (22.4955086675, 0.1497881522), (22.4820508076, 0.2990381057))
            ThreePointArc((22.4820508076, 0.2990381057), (21.8754981947, 0.1264368554), (21.245052045, 0.1111098786))
            ThreePointArc((21.245052045, 0.1111098786), (21.2487623986, 0.0556099977), (21.25, 0))
            ThreePointArc((21.25, 0), (20.8838834765, -0.8838834765), (20, -1.25))
        make_face()
        with BuildLine():
            ThreePointArc((20.254947955, 2.4869663328), (20.1276404483, 2.496739457), (20, 2.5))
            Line((20, 2.5), (20, 1.25))
            ThreePointArc((20, 1.25), (20.8436861537, 0.9223305666), (21.245052045, 0.1111098786))
            ThreePointArc((21.245052045, 0.1111098786), (21.8754981947, 0.1264368554), (22.4820508076, 0.2990381057))
            ThreePointArc((22.4820508076, 0.2990381057), (22.3282515686, 0.9106287023), (22.026302045, 1.464274572))
            ThreePointArc((22.026302045, 1.464274572), (20.875, 1.5155444566), (20.254947955, 2.4869663328))
        make_face()
        with BuildLine():
            ThreePointArc((19.3349364905, 3.8480762114), (19.2449236648, 3.6772567905), (19.1683624897, 3.5))
            Line((19.1683624897, 3.5), (20, 3.5))
            Line((20, 3.5), (20, 2.5))
            ThreePointArc((20, 2.5), (20.1276404483, 2.496739457), (20.254947955, 2.4869663328))
            ThreePointArc((20.254947955, 2.4869663328), (21.4443900023, 3.84683861), (22.75, 2.5980762114))
            ThreePointArc((22.75, 2.5980762114), (22.5536549616, 1.9255353413), (22.026302045, 1.464274572))
            ThreePointArc((22.026302045, 1.464274572), (22.3282515686, 0.9106287023), (22.4820508076, 0.2990381057))
            ThreePointArc((22.4820508076, 0.2990381057), (23.1586748831, 0.7275688919), (23.6650635095, 1.3480762114))
            ThreePointArc((23.6650635095, 1.3480762114), (23.9148145657, 1.9510285986), (24, 2.5980762114))
            ThreePointArc((24, 2.5980762114), (22.1470476128, 5.0128907771), (19.3349364905, 3.8480762114))
        make_face()
        with BuildLine():
            Line((19.1683624897, 3.5), (19.1339745962, 3.5))
            Line((19.1339745962, 3.5), (17.8349364905, 1.25))
            ThreePointArc((17.8349364905, 1.25), (18.3413251169, 1.8705073194), (19.0179491924, 2.2990381057))
            ThreePointArc((19.0179491924, 2.2990381057), (19.0193798813, 2.9087590507), (19.1683624897, 3.5))
        make_face()
        with BuildLine():
            Line((20, 3.5), (19.1683624897, 3.5))
            ThreePointArc((19.1683624897, 3.5), (19.0193798813, 2.9087590507), (19.0179491924, 2.2990381057))
            ThreePointArc((19.0179491924, 2.2990381057), (19.4987990743, 2.4492442982), (20, 2.5))
            Line((20, 2.5), (20, 3.5))
        make_face()
        with BuildLine():
            Line((19.3349364905, 3.8480762114), (19.1339745962, 3.5))
            Line((19.1339745962, 3.5), (19.1683624897, 3.5))
            ThreePointArc((19.1683624897, 3.5), (19.2449236648, 3.6772567905), (19.3349364905, 3.8480762114))
        make_face()
        with BuildLine():
            ThreePointArc((20, 2.5), (19.4987990743, 2.4492442982), (19.0179491924, 2.2990381057))
            ThreePointArc((19.0179491924, 2.2990381057), (19.1717484314, 1.6874475091), (19.473697955, 1.1338016393))
            ThreePointArc((19.473697955, 1.1338016393), (19.7305116414, 1.2206047782), (20, 1.25))
            Line((20, 1.25), (20, 2.5))
        make_face()
    extrude(amount=F3_DEPTH)


with BuildPart() as f2:
    # F0 (on Front) → F2 (new body)
    with BuildSketch(Plane.XZ):
        with BuildLine():
            Line((-8.5635083269, 3.5), (-12.4364916731, 3.5))
            ThreePointArc((-12.4364916731, 3.5), (-14.5, 0), (-12.4364916731, -3.5))
            Line((-12.4364916731, -3.5), (-8.5635083269, -3.5))
            ThreePointArc((-8.5635083269, -3.5), (-7.0542804313, -2.0315060063), (-6.5, 0))
            ThreePointArc((-6.5, 0), (-7.0542804313, 2.0315060063), (-8.5635083269, 3.5))
        make_face()
        with Locations((-10.5, 0)):
            Circle(F0_R, mode=Mode.SUBTRACT)
        with BuildLine():
            ThreePointArc((-8.5635083269, 3.5), (-10.5, 4), (-12.4364916731, 3.5))
            Line((-12.4364916731, 3.5), (-8.5635083269, 3.5))
        make_face()
        with BuildLine():
            Line((-8.5635083269, -3.5), (-12.4364916731, -3.5))
            ThreePointArc((-12.4364916731, -3.5), (-10.5, -4), (-8.5635083269, -3.5))
        make_face()
    extrude(amount=F2_DEPTH)


with BuildPart() as f2b:
    # F0 (on Front) → F2, piece 2 (new body)
    with BuildSketch(Plane.XZ):
        with BuildLine():
            ThreePointArc((12.4364916731, 3.5), (10.5, 4), (8.5635083269, 3.5))
            Line((8.5635083269, 3.5), (12.4364916731, 3.5))
        make_face()
        with BuildLine():
            Line((12.4364916731, 3.5), (8.5635083269, 3.5))
            ThreePointArc((8.5635083269, 3.5), (6.5, 0), (8.5635083269, -3.5))
            Line((8.5635083269, -3.5), (12.4364916731, -3.5))
            ThreePointArc((12.4364916731, -3.5), (13.9457195687, -2.0315060063), (14.5, 0))
            ThreePointArc((14.5, 0), (13.9457195687, 2.0315060063), (12.4364916731, 3.5))
        make_face()
        with Locations((10.5, 0)):
            Circle(F0_R, mode=Mode.SUBTRACT)
        with BuildLine():
            Line((12.4364916731, -3.5), (8.5635083269, -3.5))
            ThreePointArc((8.5635083269, -3.5), (10.5, -4), (12.4364916731, -3.5))
        make_face()
    extrude(amount=F2_DEPTH)


solid = Compound([f1.part, f2.part, f2b.part])
